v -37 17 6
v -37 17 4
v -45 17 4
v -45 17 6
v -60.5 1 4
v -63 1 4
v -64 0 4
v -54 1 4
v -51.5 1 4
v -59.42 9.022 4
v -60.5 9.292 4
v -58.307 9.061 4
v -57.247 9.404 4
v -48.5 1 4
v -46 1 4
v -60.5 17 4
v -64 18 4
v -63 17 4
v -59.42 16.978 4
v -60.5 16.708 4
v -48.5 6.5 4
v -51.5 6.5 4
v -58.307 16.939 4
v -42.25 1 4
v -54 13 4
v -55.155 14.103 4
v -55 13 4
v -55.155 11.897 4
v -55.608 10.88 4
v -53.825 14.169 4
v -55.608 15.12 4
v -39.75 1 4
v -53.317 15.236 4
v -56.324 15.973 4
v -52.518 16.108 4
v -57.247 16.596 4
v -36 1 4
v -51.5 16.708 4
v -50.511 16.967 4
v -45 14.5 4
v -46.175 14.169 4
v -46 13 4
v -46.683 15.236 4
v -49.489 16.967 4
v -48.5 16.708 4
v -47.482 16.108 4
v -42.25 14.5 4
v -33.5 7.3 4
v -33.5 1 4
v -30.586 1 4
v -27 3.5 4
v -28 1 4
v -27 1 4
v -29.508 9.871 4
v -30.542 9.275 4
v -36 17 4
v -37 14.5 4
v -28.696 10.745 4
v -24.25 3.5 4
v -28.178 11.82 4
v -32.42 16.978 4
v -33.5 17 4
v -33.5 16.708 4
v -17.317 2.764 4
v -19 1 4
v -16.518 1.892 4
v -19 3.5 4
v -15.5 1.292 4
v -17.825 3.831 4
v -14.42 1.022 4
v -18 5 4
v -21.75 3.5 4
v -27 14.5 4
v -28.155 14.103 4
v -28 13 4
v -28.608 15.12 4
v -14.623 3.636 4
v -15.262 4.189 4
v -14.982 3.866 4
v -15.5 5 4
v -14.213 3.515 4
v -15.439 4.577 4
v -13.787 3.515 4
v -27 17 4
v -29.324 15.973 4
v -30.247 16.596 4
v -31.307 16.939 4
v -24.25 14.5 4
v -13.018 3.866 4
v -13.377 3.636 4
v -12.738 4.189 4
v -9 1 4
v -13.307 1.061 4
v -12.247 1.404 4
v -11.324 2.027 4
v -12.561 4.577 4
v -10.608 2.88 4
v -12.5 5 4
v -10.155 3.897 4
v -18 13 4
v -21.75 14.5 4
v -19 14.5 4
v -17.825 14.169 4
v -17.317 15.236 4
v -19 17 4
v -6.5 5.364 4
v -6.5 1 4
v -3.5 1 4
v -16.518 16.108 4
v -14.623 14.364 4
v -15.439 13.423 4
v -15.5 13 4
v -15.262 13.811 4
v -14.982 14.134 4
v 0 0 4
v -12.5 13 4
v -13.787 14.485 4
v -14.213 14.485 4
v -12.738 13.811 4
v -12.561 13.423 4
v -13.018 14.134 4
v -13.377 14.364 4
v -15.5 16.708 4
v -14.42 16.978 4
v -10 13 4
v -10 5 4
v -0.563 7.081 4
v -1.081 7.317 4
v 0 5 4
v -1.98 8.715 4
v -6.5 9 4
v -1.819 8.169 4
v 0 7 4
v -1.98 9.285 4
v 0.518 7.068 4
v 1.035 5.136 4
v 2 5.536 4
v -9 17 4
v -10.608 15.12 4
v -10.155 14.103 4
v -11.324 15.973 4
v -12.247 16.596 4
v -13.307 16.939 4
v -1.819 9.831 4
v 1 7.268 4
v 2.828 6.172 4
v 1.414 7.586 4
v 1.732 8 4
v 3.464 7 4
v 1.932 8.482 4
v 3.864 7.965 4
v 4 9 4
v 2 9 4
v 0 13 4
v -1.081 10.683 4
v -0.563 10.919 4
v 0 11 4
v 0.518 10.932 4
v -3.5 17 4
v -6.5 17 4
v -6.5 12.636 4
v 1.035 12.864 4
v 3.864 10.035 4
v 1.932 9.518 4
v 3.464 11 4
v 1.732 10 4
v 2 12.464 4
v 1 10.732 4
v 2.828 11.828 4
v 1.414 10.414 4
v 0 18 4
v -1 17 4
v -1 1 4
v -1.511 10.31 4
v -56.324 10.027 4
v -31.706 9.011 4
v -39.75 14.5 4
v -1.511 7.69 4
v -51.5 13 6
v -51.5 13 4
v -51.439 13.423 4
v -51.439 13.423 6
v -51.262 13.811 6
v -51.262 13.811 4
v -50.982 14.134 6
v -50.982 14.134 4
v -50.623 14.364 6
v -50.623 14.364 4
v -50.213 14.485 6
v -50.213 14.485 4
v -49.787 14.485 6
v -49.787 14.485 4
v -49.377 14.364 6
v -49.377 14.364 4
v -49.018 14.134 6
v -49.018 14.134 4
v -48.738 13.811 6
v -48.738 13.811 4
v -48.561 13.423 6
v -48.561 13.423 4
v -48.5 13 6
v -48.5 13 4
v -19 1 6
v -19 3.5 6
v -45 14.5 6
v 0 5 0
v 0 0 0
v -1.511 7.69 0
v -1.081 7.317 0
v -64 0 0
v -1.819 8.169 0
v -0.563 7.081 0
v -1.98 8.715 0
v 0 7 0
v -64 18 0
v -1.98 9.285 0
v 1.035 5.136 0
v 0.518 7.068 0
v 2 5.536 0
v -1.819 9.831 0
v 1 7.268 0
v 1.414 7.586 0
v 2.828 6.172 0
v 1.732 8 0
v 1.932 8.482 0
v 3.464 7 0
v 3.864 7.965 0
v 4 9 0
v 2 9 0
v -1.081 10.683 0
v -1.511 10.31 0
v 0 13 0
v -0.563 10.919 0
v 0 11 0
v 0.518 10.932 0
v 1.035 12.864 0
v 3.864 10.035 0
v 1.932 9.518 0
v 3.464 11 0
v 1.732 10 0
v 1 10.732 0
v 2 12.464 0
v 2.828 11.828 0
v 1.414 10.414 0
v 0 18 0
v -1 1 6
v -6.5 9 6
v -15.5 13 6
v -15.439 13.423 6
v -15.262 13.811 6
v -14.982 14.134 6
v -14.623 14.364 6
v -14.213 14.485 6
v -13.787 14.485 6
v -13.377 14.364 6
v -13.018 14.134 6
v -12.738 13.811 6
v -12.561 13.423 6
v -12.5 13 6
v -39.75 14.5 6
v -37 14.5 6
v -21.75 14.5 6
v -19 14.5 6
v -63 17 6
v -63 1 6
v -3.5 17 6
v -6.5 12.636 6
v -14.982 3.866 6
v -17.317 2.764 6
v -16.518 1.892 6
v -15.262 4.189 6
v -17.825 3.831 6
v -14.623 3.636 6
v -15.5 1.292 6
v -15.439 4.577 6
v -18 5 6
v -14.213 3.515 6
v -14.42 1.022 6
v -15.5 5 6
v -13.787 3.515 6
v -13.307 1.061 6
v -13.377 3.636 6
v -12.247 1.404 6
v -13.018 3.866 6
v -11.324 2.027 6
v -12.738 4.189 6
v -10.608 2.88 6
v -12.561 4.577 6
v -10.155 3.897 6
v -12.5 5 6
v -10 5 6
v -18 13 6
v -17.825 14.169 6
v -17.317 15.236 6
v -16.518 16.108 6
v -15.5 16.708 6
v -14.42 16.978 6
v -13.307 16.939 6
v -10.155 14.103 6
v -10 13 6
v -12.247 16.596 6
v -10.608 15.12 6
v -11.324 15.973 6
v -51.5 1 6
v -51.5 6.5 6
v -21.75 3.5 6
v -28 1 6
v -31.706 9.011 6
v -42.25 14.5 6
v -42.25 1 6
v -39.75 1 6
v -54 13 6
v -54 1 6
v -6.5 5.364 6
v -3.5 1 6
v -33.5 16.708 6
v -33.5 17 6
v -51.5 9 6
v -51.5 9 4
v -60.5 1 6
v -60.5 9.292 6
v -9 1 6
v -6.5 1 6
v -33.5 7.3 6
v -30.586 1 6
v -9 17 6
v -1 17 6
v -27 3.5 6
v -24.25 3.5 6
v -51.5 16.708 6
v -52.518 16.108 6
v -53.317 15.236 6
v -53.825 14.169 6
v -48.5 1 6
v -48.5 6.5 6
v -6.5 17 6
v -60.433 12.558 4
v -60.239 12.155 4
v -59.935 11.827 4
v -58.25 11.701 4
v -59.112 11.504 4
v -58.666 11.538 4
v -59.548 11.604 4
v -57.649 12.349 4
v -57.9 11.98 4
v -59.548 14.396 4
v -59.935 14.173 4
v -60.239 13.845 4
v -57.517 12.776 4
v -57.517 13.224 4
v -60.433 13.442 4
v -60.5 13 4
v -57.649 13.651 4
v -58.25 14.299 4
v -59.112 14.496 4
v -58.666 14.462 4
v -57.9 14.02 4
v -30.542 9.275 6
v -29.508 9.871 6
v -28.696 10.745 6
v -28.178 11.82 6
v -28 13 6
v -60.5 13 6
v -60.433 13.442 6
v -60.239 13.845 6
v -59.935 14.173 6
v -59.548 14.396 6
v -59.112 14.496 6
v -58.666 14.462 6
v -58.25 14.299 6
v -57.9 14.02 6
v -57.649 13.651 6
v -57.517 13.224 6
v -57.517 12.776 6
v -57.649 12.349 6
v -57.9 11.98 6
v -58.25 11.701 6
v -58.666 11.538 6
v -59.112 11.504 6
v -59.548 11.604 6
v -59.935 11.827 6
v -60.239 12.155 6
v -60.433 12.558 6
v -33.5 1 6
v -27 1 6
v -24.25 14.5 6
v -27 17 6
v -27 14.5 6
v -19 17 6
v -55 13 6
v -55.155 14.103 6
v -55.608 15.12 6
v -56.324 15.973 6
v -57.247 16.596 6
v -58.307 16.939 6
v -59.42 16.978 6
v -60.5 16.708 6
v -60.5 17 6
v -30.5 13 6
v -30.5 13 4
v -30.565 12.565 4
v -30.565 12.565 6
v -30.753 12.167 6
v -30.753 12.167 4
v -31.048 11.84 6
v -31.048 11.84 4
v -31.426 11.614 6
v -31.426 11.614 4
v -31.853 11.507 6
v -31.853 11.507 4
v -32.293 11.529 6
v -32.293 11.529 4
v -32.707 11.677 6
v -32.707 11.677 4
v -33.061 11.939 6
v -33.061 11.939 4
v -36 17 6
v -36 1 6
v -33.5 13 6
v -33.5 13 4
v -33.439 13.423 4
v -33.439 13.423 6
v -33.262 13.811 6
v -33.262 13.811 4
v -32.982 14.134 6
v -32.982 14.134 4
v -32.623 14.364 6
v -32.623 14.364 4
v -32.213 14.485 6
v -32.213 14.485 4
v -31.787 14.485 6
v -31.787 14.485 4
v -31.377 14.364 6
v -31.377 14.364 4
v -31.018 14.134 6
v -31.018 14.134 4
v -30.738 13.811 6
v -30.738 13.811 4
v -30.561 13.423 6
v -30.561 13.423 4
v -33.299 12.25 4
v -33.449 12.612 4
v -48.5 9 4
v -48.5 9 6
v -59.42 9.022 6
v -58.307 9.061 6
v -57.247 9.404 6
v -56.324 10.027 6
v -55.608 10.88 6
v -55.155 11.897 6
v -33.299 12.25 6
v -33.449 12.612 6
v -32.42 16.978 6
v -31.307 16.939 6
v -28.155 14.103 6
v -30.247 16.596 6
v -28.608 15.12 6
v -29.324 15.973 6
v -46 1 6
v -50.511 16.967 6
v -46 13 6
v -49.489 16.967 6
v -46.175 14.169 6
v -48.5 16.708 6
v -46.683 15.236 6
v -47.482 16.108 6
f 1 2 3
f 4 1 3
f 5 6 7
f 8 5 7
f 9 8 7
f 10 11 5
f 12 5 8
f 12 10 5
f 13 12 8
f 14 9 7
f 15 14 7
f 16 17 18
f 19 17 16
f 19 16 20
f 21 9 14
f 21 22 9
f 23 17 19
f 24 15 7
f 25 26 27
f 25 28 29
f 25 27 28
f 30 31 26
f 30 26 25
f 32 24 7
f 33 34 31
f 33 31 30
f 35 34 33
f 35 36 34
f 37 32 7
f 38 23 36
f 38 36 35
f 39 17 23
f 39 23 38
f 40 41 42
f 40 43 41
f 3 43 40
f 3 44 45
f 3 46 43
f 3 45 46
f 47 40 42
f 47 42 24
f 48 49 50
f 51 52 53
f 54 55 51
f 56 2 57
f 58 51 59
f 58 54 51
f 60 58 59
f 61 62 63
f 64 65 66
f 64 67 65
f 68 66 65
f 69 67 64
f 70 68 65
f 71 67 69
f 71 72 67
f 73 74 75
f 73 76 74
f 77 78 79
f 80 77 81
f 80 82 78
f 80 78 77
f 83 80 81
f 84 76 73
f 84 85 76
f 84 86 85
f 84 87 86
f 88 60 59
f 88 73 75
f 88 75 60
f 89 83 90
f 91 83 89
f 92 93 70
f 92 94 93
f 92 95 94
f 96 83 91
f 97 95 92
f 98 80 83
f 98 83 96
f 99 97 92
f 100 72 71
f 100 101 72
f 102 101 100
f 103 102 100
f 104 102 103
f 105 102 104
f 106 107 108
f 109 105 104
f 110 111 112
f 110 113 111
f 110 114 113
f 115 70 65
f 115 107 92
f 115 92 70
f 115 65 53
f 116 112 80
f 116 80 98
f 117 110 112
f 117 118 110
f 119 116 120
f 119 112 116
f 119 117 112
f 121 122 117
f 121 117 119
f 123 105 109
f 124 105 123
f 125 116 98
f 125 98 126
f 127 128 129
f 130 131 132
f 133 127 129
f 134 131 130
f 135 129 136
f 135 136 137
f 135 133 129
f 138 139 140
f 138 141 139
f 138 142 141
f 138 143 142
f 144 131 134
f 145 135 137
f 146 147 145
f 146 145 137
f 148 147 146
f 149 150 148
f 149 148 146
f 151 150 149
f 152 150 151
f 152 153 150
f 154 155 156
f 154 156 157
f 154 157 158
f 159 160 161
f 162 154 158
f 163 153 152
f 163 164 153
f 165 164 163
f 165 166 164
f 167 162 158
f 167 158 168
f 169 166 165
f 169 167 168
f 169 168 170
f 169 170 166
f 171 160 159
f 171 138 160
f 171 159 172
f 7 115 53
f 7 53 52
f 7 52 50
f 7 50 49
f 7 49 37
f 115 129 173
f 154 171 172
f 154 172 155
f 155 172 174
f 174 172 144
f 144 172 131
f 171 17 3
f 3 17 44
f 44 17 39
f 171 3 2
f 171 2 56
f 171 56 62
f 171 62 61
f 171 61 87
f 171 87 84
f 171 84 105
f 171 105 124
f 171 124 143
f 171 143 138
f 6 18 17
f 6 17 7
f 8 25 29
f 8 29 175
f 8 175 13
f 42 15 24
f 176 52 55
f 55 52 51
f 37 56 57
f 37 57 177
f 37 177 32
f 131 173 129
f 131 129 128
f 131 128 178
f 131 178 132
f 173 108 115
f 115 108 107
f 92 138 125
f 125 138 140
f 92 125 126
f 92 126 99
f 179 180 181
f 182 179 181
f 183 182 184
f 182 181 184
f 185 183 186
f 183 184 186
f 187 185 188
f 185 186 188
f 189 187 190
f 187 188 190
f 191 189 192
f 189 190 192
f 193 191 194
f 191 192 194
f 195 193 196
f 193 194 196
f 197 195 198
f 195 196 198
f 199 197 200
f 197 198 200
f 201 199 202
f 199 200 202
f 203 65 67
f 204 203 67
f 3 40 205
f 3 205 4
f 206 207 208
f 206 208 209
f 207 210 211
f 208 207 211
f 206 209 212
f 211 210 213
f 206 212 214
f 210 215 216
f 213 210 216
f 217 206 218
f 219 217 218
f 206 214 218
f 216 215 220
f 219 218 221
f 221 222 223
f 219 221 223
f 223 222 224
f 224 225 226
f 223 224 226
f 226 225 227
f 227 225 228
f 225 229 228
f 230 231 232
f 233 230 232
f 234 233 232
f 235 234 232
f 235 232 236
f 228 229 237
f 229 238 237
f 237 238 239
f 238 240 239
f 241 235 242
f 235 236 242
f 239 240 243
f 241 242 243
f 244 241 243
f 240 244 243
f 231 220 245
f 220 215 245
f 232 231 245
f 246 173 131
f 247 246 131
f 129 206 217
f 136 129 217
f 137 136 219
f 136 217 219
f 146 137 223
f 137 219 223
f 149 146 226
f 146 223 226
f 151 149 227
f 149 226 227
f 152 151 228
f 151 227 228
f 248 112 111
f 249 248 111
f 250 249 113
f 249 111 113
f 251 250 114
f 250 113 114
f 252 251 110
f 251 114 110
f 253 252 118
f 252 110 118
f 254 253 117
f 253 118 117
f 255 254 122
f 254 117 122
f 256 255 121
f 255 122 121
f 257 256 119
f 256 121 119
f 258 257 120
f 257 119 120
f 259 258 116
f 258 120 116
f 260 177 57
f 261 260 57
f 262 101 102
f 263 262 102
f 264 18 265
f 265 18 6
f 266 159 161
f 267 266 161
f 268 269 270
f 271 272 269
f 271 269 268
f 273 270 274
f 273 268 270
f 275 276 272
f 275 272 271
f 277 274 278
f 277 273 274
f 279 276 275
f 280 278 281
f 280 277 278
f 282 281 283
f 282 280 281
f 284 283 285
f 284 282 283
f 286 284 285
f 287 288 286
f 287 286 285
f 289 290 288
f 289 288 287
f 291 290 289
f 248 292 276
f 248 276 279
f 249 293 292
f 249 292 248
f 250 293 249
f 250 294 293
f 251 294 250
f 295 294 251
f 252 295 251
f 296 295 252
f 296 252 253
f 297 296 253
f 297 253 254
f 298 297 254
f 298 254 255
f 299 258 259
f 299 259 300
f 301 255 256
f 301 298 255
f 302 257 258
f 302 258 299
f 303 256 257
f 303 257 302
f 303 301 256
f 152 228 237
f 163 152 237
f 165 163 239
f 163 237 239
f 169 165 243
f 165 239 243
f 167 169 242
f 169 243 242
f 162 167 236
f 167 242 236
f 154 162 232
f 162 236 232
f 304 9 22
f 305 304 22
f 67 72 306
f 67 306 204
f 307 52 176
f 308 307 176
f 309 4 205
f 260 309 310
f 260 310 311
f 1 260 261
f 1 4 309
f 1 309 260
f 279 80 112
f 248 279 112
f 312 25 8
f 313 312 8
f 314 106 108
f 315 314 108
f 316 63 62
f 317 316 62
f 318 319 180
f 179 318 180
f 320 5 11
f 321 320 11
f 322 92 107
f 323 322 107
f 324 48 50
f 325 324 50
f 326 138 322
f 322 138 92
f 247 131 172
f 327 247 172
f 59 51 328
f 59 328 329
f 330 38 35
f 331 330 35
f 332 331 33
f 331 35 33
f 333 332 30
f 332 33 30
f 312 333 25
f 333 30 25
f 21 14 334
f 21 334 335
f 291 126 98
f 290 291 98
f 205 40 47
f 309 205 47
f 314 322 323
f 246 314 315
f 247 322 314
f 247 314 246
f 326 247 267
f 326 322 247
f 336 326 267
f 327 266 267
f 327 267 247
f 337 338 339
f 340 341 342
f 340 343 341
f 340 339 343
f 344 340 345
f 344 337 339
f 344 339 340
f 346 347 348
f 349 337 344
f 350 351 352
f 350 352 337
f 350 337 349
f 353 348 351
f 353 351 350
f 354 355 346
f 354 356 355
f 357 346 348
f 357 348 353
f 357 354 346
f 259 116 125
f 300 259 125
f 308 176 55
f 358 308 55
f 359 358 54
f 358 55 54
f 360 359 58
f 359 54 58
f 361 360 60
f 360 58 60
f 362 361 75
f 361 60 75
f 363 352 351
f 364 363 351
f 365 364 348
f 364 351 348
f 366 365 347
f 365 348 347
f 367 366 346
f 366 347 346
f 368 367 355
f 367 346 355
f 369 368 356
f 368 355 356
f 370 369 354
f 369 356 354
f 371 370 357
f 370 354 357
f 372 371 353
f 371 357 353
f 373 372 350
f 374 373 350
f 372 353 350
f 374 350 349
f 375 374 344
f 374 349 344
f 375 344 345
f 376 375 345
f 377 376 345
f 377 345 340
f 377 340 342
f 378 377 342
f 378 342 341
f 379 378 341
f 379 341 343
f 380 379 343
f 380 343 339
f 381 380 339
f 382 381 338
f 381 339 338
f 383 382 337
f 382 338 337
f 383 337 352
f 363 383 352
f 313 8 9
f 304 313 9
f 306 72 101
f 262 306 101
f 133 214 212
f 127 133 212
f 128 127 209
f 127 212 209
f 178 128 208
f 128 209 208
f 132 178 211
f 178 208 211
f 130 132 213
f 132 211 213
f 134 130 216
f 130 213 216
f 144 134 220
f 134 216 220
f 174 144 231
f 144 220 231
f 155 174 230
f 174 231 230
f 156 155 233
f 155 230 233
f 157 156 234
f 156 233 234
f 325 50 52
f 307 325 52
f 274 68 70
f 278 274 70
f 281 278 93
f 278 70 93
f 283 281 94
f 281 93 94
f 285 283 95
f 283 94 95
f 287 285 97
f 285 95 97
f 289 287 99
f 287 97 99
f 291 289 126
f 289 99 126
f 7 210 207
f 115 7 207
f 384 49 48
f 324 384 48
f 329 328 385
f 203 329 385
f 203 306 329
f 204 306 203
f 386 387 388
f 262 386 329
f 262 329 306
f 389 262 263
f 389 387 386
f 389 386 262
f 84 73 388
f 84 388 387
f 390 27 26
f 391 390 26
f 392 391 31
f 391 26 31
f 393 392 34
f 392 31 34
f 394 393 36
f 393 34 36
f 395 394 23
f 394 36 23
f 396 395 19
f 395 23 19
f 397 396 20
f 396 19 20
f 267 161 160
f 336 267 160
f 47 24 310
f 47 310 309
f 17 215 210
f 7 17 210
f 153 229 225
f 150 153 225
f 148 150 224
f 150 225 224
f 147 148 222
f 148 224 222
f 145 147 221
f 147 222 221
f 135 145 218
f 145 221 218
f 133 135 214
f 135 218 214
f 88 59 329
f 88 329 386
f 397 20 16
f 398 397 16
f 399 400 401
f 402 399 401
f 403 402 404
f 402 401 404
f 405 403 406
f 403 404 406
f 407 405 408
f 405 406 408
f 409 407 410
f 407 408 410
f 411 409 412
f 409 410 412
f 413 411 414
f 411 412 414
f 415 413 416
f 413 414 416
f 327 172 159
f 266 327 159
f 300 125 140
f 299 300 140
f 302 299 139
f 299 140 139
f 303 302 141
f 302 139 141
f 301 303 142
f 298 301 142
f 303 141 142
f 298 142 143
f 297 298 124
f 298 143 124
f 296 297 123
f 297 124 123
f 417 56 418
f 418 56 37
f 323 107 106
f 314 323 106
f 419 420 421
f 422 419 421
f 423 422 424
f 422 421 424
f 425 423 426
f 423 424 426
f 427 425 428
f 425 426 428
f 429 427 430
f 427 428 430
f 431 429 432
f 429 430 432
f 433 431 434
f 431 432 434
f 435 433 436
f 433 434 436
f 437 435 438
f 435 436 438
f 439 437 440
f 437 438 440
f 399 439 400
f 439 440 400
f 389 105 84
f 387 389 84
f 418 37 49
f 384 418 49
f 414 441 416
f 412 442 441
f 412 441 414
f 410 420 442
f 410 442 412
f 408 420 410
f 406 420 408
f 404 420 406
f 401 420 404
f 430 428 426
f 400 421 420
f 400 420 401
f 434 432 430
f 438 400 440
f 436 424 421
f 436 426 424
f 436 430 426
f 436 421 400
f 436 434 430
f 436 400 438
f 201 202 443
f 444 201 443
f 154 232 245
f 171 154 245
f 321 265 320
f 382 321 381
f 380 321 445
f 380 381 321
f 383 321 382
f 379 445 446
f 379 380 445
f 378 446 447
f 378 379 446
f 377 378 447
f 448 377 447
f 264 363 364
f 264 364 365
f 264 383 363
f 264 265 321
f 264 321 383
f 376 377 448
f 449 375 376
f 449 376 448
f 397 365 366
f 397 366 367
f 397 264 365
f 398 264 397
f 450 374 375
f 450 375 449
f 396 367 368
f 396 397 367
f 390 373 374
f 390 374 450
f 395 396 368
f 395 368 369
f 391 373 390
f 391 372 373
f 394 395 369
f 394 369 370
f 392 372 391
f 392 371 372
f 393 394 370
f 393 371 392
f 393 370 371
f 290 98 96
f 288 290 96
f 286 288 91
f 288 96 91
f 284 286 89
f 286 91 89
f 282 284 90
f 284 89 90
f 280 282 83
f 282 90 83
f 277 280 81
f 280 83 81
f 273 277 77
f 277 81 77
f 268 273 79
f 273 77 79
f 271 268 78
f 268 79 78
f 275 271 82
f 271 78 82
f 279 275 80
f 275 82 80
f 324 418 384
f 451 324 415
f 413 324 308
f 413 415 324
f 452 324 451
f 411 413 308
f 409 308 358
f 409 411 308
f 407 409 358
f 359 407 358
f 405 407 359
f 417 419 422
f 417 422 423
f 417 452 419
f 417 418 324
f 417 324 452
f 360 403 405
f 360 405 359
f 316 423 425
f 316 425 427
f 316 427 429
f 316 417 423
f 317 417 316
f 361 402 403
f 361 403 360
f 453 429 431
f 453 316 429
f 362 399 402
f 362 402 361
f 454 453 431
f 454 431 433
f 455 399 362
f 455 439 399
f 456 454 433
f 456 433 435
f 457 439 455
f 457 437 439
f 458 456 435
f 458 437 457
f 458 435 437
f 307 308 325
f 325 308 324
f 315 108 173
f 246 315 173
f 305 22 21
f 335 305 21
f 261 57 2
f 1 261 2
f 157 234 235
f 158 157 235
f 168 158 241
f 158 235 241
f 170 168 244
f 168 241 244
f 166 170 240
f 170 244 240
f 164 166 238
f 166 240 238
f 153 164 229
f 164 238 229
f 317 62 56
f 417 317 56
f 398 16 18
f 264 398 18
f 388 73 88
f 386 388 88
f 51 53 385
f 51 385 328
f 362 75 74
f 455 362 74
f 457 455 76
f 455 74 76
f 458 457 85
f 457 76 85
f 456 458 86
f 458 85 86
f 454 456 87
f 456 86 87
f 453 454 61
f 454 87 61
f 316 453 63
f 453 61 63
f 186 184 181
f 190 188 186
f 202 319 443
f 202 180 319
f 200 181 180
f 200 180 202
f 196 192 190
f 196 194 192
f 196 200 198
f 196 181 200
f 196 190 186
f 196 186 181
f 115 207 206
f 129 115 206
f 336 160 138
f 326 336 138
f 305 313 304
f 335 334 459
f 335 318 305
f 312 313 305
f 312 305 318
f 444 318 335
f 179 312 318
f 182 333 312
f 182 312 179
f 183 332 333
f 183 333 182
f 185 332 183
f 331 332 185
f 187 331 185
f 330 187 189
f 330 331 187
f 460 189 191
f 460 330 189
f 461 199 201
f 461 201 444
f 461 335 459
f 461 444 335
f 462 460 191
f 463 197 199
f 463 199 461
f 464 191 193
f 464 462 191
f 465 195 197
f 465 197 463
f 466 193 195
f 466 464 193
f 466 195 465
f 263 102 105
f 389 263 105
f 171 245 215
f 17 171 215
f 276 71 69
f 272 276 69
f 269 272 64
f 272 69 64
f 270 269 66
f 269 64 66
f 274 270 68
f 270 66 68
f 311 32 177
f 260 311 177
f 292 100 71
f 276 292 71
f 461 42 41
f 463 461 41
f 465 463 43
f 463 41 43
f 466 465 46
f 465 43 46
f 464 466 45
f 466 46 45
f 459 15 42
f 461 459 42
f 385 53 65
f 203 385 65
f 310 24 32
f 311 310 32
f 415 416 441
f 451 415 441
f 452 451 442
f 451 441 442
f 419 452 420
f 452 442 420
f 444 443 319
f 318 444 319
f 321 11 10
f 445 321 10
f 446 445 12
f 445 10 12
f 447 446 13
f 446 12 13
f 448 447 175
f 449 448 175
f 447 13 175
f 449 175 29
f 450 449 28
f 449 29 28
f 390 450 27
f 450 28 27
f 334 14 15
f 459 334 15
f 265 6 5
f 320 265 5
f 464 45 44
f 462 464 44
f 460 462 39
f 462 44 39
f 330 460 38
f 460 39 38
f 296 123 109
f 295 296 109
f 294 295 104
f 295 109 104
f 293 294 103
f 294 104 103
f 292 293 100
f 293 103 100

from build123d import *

# Parameters (mm, degrees)
F1_DEPTH = 4
F2_W     = 2.5
F2_H     = 2.5
F2_H_2   = 5.5
F2_W_2   = 2.75
F2_H_3   = 13.5
F2_H_4   = 11
F3_DEPTH = 2


with BuildPart() as f1:
    # F0 (on Top) → F1 (new body)
    with BuildSketch(Plane.XY):
        with BuildLine():
            Line((-64, 0), (0, 0))
            Line((0, 0), (0, 5))
            ThreePointArc((0, 5), (-4, 9), (0, 13))
            Line((0, 13), (0, 18))
            Line((0, 18), (-64, 18))
            Line((-64, 18), (-64, 0))
        make_face()
        with BuildLine():
            ThreePointArc((0, 13), (-4, 9), (0, 5))
            Line((0, 5), (0, 7))
            ThreePointArc((0, 7), (-2, 9), (0, 11))
            Line((0, 11), (0, 13))
        make_face()
        with BuildLine():
            Line((0, 7), (0, 5))
            ThreePointArc((0, 5), (2.8284271247, 6.1715728753), (4, 9))
            ThreePointArc((4, 9), (2.8284271247, 11.8284271247), (0, 13))
            Line((0, 13), (0, 11))
            ThreePointArc((0, 11), (1.4142135624, 10.4142135624), (2, 9))
            ThreePointArc((2, 9), (1.4142135624, 7.5857864376), (0, 7))
        make_face()
    extrude(amount=F1_DEPTH)

    # F2 (on face) → F3 (join)
    with BuildSketch(Plane.XY.offset(4)):
        with BuildLine():
            Line((-60.5, 17), (-63, 17))
            Line((-63, 17), (-63, 13))
            ThreePointArc((-63, 13), (-62.3166247904, 15.2360679775), (-60.5, 16.7080992435))
            Line((-60.5, 16.7080992435), (-60.5, 17))
        make_face()
        with BuildLine():
            ThreePointArc((-60.5, 9.2919007565), (-62.3166247904, 10.7639320225), (-63, 13))
            Line((-63, 13), (-63, 1))
            Line((-63, 1), (-60.5, 1))
            Line((-60.5, 1), (-60.5, 9.2919007565))
        make_face()
        with BuildLine():
            ThreePointArc((-60.5, 16.7080992435), (-62.3166247904, 15.2360679775), (-63, 13))
            ThreePointArc((-63, 13), (-62.3166247904, 10.7639320225), (-60.5, 9.2919007565))
            Line((-60.5, 9.2919007565), (-60.5, 13))
            Line((-60.5, 13), (-60.5, 16.7080992435))
        make_face()
        with BuildLine():
            ThreePointArc((-55, 13), (-56.7639320225, 16.3166247904), (-60.5, 16.7080992435))
            Line((-60.5, 16.7080992435), (-60.5, 13))
            Line((-60.5, 13), (-60.5, 9.2919007565))
            ThreePointArc((-60.5, 9.2919007565), (-56.7639320225, 9.6833752096), (-55, 13))
        make_face()
        with BuildLine():
            ThreePointArc((-57.5, 13), (-59, 11.5), (-60.5, 13))
            ThreePointArc((-60.5, 13), (-59, 14.5), (-57.5, 13))
        make_face(mode=Mode.SUBTRACT)
        with Locations((-52.75, 7.75)):
            Rectangle(F2_W, F2_H)
        with BuildLine():
            Line((-54, 13), (-54, 9))
            Line((-54, 9), (-51.5, 9))
            Line((-51.5, 9), (-51.5, 9.2919007565))
            ThreePointArc((-51.5, 9.2919007565), (-53.3166247904, 10.7639320225), (-54, 13))
        make_face()
        with Locations((-52.75, 3.75)):
            Rectangle(F2_W, F2_H_2)
        with BuildLine():
            ThreePointArc((-51.5, 16.7080992435), (-53.3166247904, 15.2360679775), (-54, 13))
            ThreePointArc((-54, 13), (-53.3166247904, 10.7639320225), (-51.5, 9.2919007565))
            Line((-51.5, 9.2919007565), (-51.5, 13))
            Line((-51.5, 13), (-51.5, 16.7080992435))
        make_face()
        Polygon((-50, 9), (-51.5, 9), (-51.5, 6.5), (-48.5, 6.5), (-48.5, 9), align=None)
        with BuildLine():
            ThreePointArc((-48.5, 16.7080992435), (-50, 17), (-51.5, 16.7080992435))
            Line((-51.5, 16.7080992435), (-51.5, 13))
            ThreePointArc((-51.5, 13), (-50, 14.5), (-48.5, 13))
            Line((-48.5, 13), (-48.5, 16.7080992435))
        make_face()
        with Locations((-47.25, 3.75)):
            Rectangle(F2_W, F2_H_2)
        with Locations((-47.25, 7.75)):
            Rectangle(F2_W, F2_H)
        with BuildLine():
            ThreePointArc((-46, 13), (-46.6833752096, 15.2360679775), (-48.5, 16.7080992435))
            Line((-48.5, 16.7080992435), (-48.5, 13))
            Line((-48.5, 13), (-48.5, 9.2919007565))
            ThreePointArc((-48.5, 9.2919007565), (-46.6833752096, 10.7639320225), (-46, 13))
        make_face()
        with BuildLine():
            Line((-48.5, 9.2919007565), (-48.5, 9))
            Line((-48.5, 9), (-46, 9))
            Line((-46, 9), (-46, 13))
            ThreePointArc((-46, 13), (-46.6833752096, 10.7639320225), (-48.5, 9.2919007565))
        make_face()
        with Locations((-43.625, 15.75)):
            Rectangle(F2_W_2, F2_H)
        with Locations((-41, 15.75)):
            Rectangle(F2_W, F2_H)
        with Locations((-38.375, 15.75)):
            Rectangle(F2_W_2, F2_H)
        with Locations((-41, 7.75)):
            Rectangle(F2_W, F2_H_3)
        with BuildLine():
            Line((-33.5, 17), (-36, 17))
            Line((-36, 17), (-36, 13))
            ThreePointArc((-36, 13), (-35.3166247904, 15.2360679775), (-33.5, 16.7080992435))
            Line((-33.5, 16.7080992435), (-33.5, 17))
        make_face()
        with BuildLine():
            ThreePointArc((-34.8284271247, 10.1715728753), (-35.69551813, 11.4692662705), (-36, 13))
            Line((-36, 13), (-36, 1))
            Line((-36, 1), (-33.5, 1))
            Line((-33.5, 1), (-33.5, 7.299987892))
            Line((-33.5, 7.299987892), (-34.8284271247, 10.1715728753))
        make_face()
        with BuildLine():
            ThreePointArc((-33.5, 16.7080992435), (-35.3166247904, 15.2360679775), (-36, 13))
            ThreePointArc((-36, 13), (-35.69551813, 11.4692662705), (-34.8284271247, 10.1715728753))
            ThreePointArc((-34.8284271247, 10.1715728753), (-34.2084555922, 9.6649252036), (-33.5, 9.2919007565))
            Line((-33.5, 9.2919007565), (-33.5, 13))
            Line((-33.5, 13), (-33.5, 16.7080992435))
        make_face()
        with BuildLine():
            ThreePointArc((-28, 13), (-29.7639320225, 16.3166247904), (-33.5, 16.7080992435))
            Line((-33.5, 16.7080992435), (-33.5, 13))
            ThreePointArc((-33.5, 13), (-32, 14.5), (-30.5, 13))
            ThreePointArc((-30.5, 13), (-31.4259748515, 11.6141807012), (-33.0606601718, 11.9393398282))
            Line((-33.0606601718, 11.9393398282), (-31.7058974503, 9.0108266909))
            ThreePointArc((-31.7058974503, 9.0108266909), (-29.0694360441, 10.2775388156), (-28, 13))
        make_face()
        with BuildLine():
            ThreePointArc((-33.5, 9.2919007565), (-34.2084555922, 9.6649252036), (-34.8284271247, 10.1715728753))
            Line((-34.8284271247, 10.1715728753), (-33.5, 7.299987892))
            Line((-33.5, 7.299987892), (-33.5, 9.2919007565))
        make_face()
        with BuildLine():
            ThreePointArc((-33.0606601718, 11.9393398282), (-33.3858192988, 12.4259748515), (-33.5, 13))
            Line((-33.5, 13), (-33.5, 9.2919007565))
            ThreePointArc((-33.5, 9.2919007565), (-32.6191105093, 9.048202665), (-31.7058974503, 9.0108266909))
            Line((-31.7058974503, 9.0108266909), (-33.0606601718, 11.9393398282))
        make_face()
        with BuildLine():
            ThreePointArc((-31.7058974503, 9.0108266909), (-32.6191105093, 9.048202665), (-33.5, 9.2919007565))
            Line((-33.5, 9.2919007565), (-33.5, 7.299987892))
            Line((-33.5, 7.299987892), (-30.5855555903, 1))
            Line((-30.5855555903, 1), (-28, 1))
            Line((-28, 1), (-31.7058974503, 9.0108266909))
        make_face()
        with Locations((-25.625, 15.75)):
            Rectangle(F2_W_2, F2_H)
        with Locations((-23, 15.75)):
            Rectangle(F2_W, F2_H)
        with Locations((-20.375, 15.75)):
            Rectangle(F2_W_2, F2_H)
        with Locations((-23, 9)):
            Rectangle(F2_W, F2_H_4)
        with Locations((-25.625, 2.25)):
            Rectangle(F2_W_2, F2_H)
        with Locations((-23, 2.25)):
            Rectangle(F2_W, F2_H)
        with Locations((-20.375, 2.25)):
            Rectangle(F2_W_2, F2_H)
        with BuildLine():
            ThreePointArc((-15.5, 9.2919007565), (-17.3166247904, 10.7639320225), (-18, 13))
            Line((-18, 13), (-18, 5))
            ThreePointArc((-18, 5), (-17.3166247904, 7.2360679775), (-15.5, 8.7080992435))
            Line((-15.5, 8.7080992435), (-15.5, 9.2919007565))
        make_face()
        with BuildLine():
            ThreePointArc((-15.5, 16.7080992435), (-17.3166247904, 15.2360679775), (-18, 13))
            ThreePointArc((-18, 13), (-17.3166247904, 10.7639320225), (-15.5, 9.2919007565))
            Line((-15.5, 9.2919007565), (-15.5, 13))
            Line((-15.5, 13), (-15.5, 16.7080992435))
        make_face()
        with BuildLine():
            ThreePointArc((-15.5, 8.7080992435), (-17.3166247904, 7.2360679775), (-18, 5))
            ThreePointArc((-18, 5), (-17.3166247904, 2.7639320225), (-15.5, 1.2919007565))
            Line((-15.5, 1.2919007565), (-15.5, 5))
            Line((-15.5, 5), (-15.5, 8.7080992435))
        make_face()
        with BuildLine():
            ThreePointArc((-10, 13), (-11.7639320225, 16.3166247904), (-15.5, 16.7080992435))
            Line((-15.5, 16.7080992435), (-15.5, 13))
            ThreePointArc((-15.5, 13), (-14, 14.5), (-12.5, 13))
            Line((-12.5, 13), (-10, 13))
        make_face()
        with BuildLine():
            Line((-15.5, 5), (-15.5, 1.2919007565))
            ThreePointArc((-15.5, 1.2919007565), (-11.7639320225, 1.6833752096), (-10, 5))
            Line((-10, 5), (-12.5, 5))
            ThreePointArc((-12.5, 5), (-14, 3.5), (-15.5, 5))
        make_face()
        Polygon((-6.5, 17), (-9, 17), (-9, 9), (-6.5, 12.6363636364), align=None)
        Polygon((-6.5, 5.3636363636), (-9, 9), (-9, 1), (-6.5, 1), align=None)
        Polygon((-6.5, 12.6363636364), (-9, 9), (-6.5, 5.3636363636), (-6.5, 9), align=None)
        Polygon((-3.5, 17), (-6.5, 12.6363636364), (-6.5, 9), (-1, 17), align=None)
        Polygon((-6.5, 9), (-6.5, 5.3636363636), (-3.5, 1), (-1, 1), align=None)
    extrude(amount=F3_DEPTH)


solid = f1.part
